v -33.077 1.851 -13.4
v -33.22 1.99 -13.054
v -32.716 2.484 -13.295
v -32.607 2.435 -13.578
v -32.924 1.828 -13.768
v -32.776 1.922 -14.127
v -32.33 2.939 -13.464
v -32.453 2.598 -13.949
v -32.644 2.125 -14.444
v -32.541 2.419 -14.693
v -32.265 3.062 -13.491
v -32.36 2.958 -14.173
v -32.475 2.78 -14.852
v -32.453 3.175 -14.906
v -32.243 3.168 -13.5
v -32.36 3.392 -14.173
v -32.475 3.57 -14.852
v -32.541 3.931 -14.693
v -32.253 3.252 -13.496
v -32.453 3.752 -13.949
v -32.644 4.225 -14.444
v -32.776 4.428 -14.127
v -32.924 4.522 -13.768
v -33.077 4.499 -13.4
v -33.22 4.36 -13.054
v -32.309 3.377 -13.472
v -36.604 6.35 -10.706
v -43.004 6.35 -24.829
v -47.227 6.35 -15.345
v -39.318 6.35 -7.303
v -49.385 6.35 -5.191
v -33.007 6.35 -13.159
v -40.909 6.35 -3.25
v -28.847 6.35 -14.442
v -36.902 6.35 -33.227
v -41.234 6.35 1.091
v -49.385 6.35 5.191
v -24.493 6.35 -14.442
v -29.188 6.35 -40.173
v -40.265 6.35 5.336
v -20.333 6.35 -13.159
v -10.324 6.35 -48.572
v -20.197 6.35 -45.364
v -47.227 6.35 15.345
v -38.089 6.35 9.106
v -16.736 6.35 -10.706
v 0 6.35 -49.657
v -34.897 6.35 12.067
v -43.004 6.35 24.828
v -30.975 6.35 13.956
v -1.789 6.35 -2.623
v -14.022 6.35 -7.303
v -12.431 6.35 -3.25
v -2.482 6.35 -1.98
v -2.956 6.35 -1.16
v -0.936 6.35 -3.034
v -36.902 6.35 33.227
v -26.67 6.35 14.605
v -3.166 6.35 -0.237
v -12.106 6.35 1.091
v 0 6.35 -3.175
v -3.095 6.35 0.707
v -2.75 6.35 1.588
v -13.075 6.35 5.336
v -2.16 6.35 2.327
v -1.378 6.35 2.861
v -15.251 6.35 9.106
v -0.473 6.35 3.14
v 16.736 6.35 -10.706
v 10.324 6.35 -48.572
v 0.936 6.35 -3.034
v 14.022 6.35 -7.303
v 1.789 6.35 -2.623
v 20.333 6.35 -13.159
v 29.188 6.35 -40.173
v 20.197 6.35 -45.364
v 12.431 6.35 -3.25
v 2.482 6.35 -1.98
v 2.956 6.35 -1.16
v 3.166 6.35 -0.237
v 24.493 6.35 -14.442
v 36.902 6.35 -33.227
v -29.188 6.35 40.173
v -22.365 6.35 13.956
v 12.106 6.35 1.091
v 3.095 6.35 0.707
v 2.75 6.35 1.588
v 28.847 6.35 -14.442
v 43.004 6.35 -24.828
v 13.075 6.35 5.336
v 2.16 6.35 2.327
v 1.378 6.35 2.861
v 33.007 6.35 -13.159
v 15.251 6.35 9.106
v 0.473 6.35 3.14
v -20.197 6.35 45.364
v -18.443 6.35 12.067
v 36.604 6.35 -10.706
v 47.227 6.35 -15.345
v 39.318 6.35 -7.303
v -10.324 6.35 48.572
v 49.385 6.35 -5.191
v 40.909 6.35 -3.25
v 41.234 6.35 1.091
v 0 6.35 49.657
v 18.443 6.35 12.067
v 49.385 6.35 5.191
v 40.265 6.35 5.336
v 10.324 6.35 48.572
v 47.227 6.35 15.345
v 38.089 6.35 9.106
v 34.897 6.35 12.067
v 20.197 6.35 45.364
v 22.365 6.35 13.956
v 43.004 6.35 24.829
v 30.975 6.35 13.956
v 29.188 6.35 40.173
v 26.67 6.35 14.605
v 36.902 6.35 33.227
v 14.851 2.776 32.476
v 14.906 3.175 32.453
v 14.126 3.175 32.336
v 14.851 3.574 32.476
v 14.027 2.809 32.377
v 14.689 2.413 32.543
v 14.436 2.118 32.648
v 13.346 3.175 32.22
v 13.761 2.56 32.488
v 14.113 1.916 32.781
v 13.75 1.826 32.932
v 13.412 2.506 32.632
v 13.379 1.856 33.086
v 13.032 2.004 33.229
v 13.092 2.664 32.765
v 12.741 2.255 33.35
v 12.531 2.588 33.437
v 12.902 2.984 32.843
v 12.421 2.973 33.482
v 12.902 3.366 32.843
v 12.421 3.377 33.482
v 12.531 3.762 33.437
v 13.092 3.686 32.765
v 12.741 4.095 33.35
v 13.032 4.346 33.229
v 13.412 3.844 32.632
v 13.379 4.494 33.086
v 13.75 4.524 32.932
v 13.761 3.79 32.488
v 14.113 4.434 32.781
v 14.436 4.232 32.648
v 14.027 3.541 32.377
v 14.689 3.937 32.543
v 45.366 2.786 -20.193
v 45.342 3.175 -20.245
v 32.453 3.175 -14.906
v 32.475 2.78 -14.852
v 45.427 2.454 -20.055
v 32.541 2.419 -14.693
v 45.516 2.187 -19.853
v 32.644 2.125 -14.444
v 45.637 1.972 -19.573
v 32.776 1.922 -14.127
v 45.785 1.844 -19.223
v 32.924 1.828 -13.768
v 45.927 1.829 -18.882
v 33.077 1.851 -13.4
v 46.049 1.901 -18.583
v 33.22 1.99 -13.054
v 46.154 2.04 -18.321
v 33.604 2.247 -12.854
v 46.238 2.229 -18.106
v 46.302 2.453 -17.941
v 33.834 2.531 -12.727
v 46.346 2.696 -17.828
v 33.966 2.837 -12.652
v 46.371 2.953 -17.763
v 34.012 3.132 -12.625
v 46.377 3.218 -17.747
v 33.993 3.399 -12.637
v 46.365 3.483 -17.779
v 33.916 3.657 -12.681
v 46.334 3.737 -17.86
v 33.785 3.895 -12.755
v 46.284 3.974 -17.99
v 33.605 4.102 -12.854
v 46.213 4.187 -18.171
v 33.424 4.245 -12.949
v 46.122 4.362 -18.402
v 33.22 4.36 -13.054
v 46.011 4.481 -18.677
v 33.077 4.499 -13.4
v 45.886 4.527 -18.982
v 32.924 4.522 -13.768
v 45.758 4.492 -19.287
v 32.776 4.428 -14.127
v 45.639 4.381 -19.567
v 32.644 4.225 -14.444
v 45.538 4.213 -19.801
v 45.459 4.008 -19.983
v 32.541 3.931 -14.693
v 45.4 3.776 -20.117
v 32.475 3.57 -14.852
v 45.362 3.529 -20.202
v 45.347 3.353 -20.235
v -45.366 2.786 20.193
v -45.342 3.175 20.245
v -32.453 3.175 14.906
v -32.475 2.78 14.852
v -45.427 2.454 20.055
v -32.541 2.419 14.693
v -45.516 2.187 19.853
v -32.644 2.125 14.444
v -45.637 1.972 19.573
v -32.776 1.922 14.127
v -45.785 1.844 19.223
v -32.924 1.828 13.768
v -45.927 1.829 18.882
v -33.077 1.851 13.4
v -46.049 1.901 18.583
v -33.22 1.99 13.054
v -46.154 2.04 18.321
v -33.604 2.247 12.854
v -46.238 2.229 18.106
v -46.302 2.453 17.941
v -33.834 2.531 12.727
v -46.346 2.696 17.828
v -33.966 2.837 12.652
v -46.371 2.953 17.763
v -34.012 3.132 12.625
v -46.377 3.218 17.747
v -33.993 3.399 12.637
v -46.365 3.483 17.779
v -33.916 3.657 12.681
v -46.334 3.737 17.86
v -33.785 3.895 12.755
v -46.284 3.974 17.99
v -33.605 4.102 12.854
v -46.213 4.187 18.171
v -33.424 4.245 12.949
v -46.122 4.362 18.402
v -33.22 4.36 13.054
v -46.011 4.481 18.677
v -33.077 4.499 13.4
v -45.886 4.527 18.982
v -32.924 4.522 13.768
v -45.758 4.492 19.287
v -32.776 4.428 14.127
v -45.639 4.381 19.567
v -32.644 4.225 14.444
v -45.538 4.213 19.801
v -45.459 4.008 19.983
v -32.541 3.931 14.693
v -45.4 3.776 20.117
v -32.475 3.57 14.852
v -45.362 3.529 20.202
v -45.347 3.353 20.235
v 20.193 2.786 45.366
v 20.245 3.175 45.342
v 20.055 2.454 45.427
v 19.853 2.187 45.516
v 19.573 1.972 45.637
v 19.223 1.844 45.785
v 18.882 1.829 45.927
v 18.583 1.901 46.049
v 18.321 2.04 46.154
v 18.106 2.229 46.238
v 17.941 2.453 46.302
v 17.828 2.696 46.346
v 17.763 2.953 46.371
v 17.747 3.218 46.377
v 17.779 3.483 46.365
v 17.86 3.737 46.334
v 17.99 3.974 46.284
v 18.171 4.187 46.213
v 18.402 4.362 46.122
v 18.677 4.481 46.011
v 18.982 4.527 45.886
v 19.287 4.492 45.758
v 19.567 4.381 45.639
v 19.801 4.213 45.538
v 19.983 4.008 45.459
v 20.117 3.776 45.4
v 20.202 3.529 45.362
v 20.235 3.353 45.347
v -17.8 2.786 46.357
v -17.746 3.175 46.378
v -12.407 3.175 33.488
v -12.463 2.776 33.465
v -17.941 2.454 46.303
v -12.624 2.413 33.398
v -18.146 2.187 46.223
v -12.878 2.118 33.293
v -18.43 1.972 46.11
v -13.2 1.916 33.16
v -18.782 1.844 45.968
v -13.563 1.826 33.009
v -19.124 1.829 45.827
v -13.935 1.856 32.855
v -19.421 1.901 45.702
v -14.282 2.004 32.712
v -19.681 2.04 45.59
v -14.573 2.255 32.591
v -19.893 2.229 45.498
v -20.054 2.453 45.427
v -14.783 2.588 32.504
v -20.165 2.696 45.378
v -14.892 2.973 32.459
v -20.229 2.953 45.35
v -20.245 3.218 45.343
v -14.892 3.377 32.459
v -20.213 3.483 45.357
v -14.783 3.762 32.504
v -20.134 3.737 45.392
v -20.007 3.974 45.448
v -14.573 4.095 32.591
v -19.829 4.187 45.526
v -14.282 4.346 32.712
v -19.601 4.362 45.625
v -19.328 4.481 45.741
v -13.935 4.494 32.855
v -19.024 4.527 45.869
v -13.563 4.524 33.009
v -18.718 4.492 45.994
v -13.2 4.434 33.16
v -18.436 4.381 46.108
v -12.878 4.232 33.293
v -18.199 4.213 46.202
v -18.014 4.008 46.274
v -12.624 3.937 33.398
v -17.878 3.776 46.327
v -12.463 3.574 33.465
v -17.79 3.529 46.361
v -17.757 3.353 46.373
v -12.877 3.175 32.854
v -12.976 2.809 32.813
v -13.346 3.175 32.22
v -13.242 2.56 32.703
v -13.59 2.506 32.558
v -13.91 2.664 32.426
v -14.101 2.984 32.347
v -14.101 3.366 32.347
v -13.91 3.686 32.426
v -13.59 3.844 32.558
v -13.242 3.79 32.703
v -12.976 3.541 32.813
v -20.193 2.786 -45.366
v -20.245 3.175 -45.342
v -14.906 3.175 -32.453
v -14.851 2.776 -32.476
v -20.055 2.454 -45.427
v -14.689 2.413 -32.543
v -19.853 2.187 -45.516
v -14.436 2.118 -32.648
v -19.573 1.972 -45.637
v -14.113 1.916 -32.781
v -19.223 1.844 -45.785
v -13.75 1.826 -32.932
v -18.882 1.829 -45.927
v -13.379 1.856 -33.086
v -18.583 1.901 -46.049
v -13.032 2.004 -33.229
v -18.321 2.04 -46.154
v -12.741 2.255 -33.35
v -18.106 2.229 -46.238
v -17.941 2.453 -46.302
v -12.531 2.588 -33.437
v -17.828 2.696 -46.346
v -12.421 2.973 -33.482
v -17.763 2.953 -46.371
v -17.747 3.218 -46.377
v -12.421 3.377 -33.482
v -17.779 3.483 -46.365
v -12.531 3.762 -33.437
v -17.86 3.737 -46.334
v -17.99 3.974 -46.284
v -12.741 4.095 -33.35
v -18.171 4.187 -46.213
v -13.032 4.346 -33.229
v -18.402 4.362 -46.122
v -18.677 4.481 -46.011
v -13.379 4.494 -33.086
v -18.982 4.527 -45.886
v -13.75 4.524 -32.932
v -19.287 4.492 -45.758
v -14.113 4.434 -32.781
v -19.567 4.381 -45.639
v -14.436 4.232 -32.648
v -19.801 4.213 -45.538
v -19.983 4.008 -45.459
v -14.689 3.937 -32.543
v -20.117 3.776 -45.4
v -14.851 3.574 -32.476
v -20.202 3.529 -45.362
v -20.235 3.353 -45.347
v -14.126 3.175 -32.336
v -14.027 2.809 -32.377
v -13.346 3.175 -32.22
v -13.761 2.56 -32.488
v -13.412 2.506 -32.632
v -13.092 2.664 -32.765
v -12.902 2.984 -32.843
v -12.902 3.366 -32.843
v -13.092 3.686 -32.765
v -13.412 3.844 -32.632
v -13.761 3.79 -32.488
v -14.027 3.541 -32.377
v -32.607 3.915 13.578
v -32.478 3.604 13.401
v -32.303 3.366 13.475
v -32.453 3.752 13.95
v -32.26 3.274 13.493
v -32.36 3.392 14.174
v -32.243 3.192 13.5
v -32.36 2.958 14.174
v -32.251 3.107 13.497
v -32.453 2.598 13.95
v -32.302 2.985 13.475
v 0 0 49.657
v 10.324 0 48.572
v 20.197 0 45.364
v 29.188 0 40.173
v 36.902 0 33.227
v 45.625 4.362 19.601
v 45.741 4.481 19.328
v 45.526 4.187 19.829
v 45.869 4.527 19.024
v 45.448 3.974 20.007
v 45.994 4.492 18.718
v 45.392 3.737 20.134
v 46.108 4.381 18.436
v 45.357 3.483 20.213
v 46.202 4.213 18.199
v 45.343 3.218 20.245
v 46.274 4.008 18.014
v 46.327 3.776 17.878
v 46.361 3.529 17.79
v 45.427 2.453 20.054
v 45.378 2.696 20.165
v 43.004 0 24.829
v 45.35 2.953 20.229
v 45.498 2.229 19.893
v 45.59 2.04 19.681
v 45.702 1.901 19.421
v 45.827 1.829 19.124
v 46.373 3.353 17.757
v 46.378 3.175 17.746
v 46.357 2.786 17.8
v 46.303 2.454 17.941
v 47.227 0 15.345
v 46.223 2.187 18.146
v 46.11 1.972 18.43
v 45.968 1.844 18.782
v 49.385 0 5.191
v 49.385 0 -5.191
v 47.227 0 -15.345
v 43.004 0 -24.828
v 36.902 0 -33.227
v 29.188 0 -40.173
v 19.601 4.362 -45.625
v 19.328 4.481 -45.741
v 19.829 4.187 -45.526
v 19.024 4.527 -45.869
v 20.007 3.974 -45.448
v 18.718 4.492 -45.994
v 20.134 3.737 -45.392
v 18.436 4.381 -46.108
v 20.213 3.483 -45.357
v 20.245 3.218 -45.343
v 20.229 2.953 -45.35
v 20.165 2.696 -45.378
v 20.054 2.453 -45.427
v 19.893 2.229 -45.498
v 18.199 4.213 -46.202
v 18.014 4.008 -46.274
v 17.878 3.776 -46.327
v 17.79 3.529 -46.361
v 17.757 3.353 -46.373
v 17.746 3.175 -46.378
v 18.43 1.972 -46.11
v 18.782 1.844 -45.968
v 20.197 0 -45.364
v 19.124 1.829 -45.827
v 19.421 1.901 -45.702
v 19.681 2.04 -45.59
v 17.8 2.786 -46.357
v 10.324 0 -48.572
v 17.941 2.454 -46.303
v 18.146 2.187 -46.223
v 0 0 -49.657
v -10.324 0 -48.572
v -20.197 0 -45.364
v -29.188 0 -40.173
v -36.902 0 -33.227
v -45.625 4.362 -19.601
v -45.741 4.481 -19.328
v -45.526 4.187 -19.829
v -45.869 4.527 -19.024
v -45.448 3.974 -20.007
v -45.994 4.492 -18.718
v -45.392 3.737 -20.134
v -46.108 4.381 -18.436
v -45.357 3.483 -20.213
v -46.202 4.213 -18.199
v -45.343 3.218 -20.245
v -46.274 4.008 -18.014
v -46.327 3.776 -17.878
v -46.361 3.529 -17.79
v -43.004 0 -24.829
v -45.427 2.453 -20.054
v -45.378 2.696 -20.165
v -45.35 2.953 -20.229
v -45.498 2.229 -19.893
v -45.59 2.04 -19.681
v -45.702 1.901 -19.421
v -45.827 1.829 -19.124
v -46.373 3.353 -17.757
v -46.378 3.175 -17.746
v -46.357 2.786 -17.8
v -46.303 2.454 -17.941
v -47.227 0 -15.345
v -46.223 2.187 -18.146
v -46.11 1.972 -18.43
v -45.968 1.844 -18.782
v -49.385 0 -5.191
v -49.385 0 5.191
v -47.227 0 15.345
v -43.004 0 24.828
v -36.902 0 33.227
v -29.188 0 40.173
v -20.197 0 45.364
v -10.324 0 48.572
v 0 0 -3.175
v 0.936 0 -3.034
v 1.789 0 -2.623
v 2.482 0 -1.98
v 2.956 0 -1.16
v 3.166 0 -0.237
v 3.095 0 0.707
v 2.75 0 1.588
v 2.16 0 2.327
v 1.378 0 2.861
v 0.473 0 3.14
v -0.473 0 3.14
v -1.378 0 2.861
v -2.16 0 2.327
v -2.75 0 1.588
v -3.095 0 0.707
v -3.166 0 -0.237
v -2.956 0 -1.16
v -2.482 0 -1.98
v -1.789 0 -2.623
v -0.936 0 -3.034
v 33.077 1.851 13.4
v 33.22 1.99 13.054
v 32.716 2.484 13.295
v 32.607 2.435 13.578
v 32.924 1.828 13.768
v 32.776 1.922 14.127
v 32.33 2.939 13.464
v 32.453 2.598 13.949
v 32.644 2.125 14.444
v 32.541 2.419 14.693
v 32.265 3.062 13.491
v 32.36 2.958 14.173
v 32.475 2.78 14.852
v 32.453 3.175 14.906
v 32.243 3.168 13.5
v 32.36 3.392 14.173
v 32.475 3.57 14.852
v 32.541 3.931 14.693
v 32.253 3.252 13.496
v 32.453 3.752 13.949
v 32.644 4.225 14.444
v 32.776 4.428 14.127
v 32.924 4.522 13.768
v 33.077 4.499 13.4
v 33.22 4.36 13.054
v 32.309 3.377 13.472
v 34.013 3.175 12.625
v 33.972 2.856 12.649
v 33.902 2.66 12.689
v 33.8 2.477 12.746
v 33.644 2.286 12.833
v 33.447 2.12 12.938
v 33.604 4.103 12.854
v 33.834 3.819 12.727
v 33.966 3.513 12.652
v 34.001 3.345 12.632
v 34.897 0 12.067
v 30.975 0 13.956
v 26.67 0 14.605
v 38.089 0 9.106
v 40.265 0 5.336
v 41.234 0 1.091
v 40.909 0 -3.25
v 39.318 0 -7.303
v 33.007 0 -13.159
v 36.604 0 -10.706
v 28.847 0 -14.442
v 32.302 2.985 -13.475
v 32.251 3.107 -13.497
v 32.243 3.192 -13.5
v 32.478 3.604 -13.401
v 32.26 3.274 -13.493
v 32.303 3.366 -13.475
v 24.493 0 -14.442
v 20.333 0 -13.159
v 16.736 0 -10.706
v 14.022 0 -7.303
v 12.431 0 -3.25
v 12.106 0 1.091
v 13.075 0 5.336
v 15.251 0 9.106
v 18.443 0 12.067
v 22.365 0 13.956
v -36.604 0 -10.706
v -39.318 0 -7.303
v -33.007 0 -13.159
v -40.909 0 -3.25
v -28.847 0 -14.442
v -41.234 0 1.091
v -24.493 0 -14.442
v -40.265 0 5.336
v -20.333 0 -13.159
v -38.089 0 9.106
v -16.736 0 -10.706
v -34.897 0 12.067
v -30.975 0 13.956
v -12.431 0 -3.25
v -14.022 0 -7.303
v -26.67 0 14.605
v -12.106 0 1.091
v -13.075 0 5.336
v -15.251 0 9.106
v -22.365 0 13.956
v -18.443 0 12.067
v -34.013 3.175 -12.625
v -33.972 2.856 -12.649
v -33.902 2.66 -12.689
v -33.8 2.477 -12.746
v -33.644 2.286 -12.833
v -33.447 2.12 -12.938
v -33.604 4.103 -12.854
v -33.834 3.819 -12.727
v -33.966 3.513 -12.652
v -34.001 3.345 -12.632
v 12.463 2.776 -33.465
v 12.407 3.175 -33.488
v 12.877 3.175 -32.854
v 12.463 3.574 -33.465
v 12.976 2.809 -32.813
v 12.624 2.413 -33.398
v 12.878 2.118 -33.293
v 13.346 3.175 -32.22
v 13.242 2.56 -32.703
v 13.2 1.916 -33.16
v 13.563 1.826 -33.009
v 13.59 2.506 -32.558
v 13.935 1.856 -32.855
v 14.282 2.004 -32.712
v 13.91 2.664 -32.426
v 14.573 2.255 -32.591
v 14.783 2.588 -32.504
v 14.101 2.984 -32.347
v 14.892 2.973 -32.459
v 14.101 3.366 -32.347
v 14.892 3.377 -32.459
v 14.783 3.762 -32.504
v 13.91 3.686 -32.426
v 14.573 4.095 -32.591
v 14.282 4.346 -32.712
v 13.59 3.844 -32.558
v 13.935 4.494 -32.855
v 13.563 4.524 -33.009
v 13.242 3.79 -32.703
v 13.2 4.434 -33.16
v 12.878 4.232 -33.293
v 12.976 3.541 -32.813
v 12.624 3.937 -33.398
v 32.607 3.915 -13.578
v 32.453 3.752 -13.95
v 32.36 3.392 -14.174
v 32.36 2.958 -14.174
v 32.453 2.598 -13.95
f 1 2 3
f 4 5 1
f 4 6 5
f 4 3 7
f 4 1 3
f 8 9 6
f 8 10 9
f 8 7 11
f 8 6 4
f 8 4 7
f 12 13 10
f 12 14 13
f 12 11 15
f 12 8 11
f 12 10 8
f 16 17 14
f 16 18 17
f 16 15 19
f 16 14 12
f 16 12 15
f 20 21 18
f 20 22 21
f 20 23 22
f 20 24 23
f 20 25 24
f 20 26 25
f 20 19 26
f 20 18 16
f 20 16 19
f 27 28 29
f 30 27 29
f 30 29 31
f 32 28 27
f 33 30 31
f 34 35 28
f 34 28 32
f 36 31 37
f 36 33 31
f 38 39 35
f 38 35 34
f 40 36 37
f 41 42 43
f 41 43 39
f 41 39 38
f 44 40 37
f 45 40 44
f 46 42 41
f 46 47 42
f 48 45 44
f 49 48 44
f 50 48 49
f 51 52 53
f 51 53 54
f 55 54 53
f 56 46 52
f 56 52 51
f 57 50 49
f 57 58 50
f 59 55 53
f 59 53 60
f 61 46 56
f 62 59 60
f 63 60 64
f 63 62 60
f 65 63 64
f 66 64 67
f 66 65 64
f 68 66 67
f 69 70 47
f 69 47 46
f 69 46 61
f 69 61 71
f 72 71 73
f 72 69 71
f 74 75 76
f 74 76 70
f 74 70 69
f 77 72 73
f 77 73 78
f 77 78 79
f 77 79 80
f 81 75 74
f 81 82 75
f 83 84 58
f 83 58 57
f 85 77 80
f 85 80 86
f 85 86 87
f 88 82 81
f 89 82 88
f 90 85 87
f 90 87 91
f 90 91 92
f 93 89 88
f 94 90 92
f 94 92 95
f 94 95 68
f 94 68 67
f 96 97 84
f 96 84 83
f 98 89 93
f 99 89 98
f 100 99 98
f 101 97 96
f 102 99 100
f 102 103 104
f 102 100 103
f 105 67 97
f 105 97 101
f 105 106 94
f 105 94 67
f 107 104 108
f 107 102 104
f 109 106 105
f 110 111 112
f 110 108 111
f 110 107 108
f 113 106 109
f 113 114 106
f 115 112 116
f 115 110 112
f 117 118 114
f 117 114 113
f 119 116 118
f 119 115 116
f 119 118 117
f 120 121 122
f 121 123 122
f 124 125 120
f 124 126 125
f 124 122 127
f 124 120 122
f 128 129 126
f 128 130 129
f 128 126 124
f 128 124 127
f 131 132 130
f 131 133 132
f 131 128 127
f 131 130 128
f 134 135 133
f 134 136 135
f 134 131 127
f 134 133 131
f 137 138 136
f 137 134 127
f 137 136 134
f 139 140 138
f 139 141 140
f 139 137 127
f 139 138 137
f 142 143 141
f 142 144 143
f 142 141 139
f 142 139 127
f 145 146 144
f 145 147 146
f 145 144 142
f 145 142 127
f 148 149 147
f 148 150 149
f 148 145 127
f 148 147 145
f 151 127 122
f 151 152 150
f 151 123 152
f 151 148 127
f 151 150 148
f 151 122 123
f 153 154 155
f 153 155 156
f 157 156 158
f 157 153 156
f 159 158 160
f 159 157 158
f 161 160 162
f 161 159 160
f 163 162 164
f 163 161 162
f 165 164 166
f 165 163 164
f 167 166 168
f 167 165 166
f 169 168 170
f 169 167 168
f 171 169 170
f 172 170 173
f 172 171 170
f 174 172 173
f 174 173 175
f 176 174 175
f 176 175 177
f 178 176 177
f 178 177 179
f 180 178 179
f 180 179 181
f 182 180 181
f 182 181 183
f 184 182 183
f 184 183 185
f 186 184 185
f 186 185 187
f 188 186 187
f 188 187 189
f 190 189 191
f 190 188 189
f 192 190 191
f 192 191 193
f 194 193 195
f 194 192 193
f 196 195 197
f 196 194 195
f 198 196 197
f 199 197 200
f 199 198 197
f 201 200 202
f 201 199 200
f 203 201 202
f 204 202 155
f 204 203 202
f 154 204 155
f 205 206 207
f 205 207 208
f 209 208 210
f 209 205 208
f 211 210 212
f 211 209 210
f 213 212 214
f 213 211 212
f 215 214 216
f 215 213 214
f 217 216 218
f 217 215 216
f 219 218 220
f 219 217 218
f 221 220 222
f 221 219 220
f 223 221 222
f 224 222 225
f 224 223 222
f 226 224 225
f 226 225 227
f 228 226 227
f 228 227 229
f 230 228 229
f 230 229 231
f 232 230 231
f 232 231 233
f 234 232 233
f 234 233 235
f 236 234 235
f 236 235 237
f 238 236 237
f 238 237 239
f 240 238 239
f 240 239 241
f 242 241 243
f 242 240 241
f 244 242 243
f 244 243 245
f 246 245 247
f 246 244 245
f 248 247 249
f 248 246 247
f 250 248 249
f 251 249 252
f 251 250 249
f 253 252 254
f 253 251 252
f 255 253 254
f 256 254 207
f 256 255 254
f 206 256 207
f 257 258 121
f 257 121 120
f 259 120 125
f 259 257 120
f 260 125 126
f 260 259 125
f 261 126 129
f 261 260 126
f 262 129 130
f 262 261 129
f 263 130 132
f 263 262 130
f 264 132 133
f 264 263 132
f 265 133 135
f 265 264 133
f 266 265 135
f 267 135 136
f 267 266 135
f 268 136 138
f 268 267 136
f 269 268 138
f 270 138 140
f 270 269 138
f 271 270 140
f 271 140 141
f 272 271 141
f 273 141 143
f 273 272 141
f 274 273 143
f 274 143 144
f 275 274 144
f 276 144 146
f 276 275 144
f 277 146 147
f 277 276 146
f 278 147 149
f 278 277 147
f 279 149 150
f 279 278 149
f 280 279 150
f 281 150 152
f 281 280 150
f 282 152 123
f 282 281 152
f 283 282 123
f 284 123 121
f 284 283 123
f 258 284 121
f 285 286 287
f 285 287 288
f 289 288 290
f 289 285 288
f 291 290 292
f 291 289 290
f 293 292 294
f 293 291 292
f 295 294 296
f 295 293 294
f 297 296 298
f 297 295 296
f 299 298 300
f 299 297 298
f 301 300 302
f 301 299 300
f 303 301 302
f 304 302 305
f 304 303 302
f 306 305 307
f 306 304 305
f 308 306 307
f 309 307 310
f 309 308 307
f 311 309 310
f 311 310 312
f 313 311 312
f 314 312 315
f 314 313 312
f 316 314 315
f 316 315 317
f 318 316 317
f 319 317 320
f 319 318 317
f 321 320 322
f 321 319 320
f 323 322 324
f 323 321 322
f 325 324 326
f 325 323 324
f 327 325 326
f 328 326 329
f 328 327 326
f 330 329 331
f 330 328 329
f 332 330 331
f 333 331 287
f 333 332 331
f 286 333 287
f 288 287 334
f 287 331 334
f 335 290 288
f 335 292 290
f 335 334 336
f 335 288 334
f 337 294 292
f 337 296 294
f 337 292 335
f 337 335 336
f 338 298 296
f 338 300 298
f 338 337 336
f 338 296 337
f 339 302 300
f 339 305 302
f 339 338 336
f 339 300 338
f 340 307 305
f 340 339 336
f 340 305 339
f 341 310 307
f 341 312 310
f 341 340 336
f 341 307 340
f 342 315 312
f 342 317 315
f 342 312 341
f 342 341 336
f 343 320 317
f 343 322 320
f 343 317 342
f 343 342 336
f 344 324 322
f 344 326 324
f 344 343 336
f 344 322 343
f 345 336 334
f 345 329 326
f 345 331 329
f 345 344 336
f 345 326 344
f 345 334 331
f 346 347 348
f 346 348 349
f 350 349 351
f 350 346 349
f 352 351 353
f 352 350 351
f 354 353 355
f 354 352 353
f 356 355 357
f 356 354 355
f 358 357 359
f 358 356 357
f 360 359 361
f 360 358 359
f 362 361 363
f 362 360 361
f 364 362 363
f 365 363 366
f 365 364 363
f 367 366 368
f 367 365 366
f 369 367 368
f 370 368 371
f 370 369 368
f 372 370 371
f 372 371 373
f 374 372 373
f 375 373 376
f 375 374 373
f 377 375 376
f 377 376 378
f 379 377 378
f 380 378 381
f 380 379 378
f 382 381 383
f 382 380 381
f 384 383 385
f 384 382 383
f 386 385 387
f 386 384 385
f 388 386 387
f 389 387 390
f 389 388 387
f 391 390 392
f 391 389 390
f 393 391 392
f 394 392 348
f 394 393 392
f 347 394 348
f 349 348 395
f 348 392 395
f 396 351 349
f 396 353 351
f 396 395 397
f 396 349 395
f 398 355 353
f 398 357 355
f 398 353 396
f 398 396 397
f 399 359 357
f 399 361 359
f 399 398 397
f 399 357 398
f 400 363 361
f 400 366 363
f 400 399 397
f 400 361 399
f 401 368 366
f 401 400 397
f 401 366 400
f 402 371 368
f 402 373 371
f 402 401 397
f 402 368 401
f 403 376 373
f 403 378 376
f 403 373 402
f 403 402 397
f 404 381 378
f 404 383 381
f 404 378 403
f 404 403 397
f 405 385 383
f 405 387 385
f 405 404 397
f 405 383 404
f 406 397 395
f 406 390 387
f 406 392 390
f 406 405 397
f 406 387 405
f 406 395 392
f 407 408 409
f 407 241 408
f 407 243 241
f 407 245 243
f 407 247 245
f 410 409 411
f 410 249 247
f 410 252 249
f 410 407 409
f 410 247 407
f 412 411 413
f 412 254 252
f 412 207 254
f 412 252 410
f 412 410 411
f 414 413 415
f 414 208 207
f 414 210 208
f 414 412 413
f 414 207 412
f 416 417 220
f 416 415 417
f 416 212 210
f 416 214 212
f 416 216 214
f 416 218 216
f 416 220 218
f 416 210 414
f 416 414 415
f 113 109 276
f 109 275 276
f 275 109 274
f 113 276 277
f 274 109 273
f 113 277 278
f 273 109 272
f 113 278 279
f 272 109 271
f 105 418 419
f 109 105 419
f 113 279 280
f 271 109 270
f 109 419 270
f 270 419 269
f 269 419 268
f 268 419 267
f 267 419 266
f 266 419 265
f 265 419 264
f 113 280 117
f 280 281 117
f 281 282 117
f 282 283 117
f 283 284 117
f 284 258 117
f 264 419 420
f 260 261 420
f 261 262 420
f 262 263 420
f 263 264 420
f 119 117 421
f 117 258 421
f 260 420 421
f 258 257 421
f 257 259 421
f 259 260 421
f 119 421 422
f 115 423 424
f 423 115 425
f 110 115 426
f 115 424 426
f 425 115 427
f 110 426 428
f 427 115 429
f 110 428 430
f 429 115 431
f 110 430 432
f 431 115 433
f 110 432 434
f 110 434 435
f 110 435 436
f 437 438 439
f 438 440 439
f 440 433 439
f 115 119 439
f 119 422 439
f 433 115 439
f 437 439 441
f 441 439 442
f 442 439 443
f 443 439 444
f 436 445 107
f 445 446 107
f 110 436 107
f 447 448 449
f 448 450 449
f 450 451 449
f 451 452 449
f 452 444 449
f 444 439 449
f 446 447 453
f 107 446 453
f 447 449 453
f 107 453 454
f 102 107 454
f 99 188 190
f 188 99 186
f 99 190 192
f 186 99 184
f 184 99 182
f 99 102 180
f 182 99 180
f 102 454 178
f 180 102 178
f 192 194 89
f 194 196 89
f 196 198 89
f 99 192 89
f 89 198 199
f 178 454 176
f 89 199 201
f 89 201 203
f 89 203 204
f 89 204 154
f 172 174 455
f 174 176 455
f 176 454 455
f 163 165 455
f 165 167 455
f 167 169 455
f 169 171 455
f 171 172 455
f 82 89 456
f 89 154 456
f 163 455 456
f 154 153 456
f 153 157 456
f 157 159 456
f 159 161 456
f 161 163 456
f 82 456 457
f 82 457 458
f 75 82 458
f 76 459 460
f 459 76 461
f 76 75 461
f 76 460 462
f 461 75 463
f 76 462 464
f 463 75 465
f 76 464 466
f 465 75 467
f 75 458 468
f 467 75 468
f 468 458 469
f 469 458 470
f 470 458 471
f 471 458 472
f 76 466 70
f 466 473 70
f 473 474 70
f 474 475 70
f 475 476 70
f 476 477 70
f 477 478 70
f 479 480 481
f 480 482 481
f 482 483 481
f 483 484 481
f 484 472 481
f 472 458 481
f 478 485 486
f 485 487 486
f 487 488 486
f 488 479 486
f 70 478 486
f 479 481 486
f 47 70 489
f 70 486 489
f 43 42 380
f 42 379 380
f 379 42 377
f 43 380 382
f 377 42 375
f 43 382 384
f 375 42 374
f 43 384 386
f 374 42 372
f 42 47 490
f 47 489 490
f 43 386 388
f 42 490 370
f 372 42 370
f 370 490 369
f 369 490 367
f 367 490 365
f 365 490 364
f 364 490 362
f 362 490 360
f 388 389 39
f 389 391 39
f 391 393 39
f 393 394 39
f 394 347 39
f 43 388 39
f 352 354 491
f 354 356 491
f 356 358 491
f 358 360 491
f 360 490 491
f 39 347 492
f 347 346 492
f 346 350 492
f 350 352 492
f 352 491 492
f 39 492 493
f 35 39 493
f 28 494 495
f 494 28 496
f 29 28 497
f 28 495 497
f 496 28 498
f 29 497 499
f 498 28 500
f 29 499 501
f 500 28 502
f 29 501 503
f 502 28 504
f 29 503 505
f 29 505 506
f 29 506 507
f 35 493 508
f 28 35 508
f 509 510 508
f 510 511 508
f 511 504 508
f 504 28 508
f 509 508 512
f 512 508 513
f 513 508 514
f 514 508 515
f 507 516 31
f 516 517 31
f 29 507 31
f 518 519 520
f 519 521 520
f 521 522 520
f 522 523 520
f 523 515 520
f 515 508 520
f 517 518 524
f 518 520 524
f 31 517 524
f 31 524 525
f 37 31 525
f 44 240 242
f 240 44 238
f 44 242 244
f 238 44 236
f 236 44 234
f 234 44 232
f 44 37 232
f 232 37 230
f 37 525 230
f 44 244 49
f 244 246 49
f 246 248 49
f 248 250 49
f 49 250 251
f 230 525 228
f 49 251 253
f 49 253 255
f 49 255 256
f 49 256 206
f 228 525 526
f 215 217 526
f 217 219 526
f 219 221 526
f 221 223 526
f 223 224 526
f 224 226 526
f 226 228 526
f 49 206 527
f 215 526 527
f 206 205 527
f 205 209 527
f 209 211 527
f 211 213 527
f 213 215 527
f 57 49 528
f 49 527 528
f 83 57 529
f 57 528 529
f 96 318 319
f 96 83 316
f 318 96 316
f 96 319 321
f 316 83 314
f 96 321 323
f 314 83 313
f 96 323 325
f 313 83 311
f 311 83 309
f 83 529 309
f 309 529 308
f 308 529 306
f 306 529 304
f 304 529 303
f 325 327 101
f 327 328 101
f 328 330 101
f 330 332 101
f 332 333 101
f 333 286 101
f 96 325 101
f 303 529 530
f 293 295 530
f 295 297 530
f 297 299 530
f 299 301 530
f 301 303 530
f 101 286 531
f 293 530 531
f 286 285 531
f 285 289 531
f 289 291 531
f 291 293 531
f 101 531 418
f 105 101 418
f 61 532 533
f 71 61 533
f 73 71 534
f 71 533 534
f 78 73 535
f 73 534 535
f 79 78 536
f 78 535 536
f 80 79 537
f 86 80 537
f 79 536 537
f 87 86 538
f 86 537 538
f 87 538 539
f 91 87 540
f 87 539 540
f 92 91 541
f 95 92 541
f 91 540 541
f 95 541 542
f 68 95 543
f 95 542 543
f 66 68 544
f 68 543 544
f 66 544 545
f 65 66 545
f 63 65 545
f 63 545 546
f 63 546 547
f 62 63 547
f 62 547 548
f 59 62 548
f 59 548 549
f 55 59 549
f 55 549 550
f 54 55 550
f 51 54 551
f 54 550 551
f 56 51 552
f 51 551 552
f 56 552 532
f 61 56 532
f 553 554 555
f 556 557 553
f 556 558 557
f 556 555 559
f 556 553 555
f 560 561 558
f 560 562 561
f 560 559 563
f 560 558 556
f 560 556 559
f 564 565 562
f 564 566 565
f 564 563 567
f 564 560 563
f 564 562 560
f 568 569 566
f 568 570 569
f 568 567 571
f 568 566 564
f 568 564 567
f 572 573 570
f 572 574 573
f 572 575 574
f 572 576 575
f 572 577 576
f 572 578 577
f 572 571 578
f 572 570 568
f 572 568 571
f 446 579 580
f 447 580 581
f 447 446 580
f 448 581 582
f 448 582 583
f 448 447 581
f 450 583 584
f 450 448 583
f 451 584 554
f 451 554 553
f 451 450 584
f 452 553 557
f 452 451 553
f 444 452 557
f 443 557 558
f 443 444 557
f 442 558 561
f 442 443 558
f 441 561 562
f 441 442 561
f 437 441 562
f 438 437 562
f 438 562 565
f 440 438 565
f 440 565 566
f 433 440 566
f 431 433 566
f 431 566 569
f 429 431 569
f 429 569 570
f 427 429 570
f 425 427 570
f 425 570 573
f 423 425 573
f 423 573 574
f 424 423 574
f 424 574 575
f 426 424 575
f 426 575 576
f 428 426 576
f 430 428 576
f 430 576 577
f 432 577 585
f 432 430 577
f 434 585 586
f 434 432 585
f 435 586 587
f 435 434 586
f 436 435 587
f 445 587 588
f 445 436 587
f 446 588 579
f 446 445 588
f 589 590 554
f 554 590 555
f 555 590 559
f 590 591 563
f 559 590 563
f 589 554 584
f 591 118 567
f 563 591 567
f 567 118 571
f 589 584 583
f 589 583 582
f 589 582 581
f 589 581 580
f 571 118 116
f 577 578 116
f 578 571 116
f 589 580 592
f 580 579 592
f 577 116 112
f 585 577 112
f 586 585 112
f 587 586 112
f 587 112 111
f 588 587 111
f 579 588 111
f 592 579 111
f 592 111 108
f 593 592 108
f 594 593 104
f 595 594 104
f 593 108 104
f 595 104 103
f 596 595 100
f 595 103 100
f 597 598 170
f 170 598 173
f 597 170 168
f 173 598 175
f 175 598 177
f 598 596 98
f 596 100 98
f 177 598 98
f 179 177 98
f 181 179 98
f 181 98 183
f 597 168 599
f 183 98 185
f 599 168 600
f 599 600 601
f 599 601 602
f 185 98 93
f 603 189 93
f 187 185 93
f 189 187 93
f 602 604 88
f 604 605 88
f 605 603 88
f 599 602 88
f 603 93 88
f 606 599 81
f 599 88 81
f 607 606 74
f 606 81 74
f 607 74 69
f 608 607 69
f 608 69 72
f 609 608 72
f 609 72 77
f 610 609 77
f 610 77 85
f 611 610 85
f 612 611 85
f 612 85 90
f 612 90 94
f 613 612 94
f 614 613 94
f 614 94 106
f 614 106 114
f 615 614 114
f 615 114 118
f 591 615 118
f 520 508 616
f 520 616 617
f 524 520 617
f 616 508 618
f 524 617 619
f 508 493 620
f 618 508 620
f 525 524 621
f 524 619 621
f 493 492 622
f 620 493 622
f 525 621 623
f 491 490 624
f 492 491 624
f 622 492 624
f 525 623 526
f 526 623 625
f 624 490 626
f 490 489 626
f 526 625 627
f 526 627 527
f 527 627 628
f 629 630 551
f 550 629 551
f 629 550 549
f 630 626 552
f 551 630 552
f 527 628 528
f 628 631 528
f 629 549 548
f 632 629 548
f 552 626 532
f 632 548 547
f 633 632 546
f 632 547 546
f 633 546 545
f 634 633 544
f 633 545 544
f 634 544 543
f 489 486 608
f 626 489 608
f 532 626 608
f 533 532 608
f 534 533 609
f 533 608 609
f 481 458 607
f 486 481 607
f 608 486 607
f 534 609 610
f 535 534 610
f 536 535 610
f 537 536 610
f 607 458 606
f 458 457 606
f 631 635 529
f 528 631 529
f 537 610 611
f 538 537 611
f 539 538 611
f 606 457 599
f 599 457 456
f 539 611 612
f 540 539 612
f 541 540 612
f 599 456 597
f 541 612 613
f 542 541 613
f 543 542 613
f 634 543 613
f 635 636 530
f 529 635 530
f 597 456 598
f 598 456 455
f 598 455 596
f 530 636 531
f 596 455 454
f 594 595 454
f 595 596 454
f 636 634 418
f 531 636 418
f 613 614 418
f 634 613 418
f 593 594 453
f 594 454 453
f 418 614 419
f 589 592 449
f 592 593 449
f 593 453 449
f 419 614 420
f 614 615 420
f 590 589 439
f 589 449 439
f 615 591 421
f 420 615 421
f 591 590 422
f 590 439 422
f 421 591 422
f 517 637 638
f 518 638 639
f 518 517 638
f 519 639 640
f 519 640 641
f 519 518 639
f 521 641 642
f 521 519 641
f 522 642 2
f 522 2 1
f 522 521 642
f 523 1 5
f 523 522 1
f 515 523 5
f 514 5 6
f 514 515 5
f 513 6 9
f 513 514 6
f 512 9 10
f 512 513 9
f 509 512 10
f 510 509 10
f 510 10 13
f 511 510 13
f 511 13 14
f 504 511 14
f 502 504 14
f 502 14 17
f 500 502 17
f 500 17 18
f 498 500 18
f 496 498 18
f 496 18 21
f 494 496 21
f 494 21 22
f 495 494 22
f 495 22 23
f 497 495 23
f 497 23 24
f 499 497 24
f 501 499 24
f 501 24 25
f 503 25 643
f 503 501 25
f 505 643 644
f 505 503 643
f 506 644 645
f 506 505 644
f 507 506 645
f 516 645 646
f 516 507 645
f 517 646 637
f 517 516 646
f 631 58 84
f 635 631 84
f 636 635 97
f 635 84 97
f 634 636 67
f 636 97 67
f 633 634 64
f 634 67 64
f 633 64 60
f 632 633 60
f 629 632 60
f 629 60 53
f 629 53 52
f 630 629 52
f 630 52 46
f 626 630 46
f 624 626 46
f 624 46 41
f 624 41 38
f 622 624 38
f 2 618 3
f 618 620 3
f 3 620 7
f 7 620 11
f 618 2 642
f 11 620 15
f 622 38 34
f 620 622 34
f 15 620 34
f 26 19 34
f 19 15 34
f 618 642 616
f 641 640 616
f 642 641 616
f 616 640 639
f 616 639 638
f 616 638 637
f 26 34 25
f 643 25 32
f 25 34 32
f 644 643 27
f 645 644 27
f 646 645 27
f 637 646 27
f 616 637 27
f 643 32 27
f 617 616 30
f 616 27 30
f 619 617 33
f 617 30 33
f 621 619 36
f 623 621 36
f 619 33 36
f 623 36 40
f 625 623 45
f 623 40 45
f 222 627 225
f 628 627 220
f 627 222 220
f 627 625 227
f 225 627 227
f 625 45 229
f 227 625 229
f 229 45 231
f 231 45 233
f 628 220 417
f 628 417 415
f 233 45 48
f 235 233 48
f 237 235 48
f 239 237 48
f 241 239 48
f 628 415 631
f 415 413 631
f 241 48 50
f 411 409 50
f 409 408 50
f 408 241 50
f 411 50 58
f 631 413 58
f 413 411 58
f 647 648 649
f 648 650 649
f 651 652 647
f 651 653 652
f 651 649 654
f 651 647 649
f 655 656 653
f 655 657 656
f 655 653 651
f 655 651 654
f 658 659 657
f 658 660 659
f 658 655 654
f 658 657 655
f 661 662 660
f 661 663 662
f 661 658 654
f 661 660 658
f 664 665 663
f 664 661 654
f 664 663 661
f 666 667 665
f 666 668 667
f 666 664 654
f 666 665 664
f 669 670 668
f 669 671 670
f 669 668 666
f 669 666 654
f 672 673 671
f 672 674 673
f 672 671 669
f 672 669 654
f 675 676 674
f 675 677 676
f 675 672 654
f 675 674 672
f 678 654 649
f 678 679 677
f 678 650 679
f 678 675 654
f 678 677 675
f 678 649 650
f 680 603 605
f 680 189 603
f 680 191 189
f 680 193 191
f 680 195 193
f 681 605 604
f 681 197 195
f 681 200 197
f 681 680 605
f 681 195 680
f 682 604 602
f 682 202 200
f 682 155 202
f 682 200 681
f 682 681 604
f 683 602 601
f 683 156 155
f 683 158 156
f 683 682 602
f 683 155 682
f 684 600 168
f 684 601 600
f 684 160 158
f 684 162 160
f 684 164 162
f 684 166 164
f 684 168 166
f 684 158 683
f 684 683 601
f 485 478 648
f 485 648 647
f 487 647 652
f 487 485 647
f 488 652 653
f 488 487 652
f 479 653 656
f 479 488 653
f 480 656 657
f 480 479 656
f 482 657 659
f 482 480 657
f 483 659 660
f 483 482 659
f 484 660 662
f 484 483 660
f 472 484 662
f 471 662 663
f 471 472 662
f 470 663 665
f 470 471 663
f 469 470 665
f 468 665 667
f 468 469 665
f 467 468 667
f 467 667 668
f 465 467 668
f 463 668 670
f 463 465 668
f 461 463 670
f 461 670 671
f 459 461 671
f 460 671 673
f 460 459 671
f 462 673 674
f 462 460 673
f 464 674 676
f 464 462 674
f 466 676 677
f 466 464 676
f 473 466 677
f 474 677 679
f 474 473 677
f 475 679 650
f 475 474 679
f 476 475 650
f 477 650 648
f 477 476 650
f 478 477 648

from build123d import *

# Parameters (mm, degrees)
SKETCH2_R           = 49.657
BOSS_EXTRUDE1_DEPTH = 6.35
SKETCH3_R           = 14.605
CUT_EXTRUDE1_DEPTH  = 6.35
SKETCH5_R           = 3.175
CUT_EXTRUDE2_DEPTH  = 6.35
CIRPATTERN1_COUNT   = 8


with BuildPart() as part:
    # Sketch2 → Boss-Extrude1 (new body)
    with BuildSketch(Plane(origin=(0, 0, 0), x_dir=(1, 0, 0), z_dir=(0, 1, 0))):
        with Locations(Location((0, 0, 0), (0, 0, 270))):
            Circle(SKETCH2_R)
    extrude(amount=BOSS_EXTRUDE1_DEPTH)

    # Sketch3 → Cut-Extrude1 (cut)
    with BuildSketch(Plane(origin=(0, 6.35, 0), x_dir=(1, 0, 0), z_dir=(0, 1, 0))):
        with Locations(Location((26.67, 0, 0), (0, 0, 270))):
            Circle(SKETCH3_R)
        with Locations(Location((-26.67, 0, 0), (0, 0, 270))):
            Circle(SKETCH3_R)
    extrude(amount=-CUT_EXTRUDE1_DEPTH, mode=Mode.SUBTRACT)

    # Sketch5 → Cut-Extrude2 (cut)
    with BuildSketch(Plane.XZ):
        with Locations(Location((0, 0, 0), (0, 0, 270))):
            Circle(SKETCH5_R)
    extrude(amount=-CUT_EXTRUDE2_DEPTH, mode=Mode.SUBTRACT)

    # Sketch8 → #6-32 Tapped Hole1 (revolve, cut)
    with BuildSketch(Plane(origin=(-19.002911201, 3.175, 45.877085946), x_dir=(0.9238795325112864, 0, 0.38268343236509056), z_dir=(0, 1, 0))):
        Polygon((0, 0), (0, 14.78269403), (1.35255, 13.97), (1.35255, 0), align=None)
    f_6_32_tapped_hole1 = revolve(axis=Axis((-21.432950996, 3.175, 51.743720977), (0.38268343236509056, 0, -0.9238795325112865)), mode=Mode.SUBTRACT)

    # CirPattern1: #6-32 Tapped Hole1 ×8 about axis
    cirpattern1_axis = Axis((0, -0.3175, 0), (0, 1, 0))
    for i in range(1, CIRPATTERN1_COUNT):
        add(f_6_32_tapped_hole1.rotate(cirpattern1_axis, i * 360 / CIRPATTERN1_COUNT), mode=Mode.SUBTRACT)


solid = part.part
